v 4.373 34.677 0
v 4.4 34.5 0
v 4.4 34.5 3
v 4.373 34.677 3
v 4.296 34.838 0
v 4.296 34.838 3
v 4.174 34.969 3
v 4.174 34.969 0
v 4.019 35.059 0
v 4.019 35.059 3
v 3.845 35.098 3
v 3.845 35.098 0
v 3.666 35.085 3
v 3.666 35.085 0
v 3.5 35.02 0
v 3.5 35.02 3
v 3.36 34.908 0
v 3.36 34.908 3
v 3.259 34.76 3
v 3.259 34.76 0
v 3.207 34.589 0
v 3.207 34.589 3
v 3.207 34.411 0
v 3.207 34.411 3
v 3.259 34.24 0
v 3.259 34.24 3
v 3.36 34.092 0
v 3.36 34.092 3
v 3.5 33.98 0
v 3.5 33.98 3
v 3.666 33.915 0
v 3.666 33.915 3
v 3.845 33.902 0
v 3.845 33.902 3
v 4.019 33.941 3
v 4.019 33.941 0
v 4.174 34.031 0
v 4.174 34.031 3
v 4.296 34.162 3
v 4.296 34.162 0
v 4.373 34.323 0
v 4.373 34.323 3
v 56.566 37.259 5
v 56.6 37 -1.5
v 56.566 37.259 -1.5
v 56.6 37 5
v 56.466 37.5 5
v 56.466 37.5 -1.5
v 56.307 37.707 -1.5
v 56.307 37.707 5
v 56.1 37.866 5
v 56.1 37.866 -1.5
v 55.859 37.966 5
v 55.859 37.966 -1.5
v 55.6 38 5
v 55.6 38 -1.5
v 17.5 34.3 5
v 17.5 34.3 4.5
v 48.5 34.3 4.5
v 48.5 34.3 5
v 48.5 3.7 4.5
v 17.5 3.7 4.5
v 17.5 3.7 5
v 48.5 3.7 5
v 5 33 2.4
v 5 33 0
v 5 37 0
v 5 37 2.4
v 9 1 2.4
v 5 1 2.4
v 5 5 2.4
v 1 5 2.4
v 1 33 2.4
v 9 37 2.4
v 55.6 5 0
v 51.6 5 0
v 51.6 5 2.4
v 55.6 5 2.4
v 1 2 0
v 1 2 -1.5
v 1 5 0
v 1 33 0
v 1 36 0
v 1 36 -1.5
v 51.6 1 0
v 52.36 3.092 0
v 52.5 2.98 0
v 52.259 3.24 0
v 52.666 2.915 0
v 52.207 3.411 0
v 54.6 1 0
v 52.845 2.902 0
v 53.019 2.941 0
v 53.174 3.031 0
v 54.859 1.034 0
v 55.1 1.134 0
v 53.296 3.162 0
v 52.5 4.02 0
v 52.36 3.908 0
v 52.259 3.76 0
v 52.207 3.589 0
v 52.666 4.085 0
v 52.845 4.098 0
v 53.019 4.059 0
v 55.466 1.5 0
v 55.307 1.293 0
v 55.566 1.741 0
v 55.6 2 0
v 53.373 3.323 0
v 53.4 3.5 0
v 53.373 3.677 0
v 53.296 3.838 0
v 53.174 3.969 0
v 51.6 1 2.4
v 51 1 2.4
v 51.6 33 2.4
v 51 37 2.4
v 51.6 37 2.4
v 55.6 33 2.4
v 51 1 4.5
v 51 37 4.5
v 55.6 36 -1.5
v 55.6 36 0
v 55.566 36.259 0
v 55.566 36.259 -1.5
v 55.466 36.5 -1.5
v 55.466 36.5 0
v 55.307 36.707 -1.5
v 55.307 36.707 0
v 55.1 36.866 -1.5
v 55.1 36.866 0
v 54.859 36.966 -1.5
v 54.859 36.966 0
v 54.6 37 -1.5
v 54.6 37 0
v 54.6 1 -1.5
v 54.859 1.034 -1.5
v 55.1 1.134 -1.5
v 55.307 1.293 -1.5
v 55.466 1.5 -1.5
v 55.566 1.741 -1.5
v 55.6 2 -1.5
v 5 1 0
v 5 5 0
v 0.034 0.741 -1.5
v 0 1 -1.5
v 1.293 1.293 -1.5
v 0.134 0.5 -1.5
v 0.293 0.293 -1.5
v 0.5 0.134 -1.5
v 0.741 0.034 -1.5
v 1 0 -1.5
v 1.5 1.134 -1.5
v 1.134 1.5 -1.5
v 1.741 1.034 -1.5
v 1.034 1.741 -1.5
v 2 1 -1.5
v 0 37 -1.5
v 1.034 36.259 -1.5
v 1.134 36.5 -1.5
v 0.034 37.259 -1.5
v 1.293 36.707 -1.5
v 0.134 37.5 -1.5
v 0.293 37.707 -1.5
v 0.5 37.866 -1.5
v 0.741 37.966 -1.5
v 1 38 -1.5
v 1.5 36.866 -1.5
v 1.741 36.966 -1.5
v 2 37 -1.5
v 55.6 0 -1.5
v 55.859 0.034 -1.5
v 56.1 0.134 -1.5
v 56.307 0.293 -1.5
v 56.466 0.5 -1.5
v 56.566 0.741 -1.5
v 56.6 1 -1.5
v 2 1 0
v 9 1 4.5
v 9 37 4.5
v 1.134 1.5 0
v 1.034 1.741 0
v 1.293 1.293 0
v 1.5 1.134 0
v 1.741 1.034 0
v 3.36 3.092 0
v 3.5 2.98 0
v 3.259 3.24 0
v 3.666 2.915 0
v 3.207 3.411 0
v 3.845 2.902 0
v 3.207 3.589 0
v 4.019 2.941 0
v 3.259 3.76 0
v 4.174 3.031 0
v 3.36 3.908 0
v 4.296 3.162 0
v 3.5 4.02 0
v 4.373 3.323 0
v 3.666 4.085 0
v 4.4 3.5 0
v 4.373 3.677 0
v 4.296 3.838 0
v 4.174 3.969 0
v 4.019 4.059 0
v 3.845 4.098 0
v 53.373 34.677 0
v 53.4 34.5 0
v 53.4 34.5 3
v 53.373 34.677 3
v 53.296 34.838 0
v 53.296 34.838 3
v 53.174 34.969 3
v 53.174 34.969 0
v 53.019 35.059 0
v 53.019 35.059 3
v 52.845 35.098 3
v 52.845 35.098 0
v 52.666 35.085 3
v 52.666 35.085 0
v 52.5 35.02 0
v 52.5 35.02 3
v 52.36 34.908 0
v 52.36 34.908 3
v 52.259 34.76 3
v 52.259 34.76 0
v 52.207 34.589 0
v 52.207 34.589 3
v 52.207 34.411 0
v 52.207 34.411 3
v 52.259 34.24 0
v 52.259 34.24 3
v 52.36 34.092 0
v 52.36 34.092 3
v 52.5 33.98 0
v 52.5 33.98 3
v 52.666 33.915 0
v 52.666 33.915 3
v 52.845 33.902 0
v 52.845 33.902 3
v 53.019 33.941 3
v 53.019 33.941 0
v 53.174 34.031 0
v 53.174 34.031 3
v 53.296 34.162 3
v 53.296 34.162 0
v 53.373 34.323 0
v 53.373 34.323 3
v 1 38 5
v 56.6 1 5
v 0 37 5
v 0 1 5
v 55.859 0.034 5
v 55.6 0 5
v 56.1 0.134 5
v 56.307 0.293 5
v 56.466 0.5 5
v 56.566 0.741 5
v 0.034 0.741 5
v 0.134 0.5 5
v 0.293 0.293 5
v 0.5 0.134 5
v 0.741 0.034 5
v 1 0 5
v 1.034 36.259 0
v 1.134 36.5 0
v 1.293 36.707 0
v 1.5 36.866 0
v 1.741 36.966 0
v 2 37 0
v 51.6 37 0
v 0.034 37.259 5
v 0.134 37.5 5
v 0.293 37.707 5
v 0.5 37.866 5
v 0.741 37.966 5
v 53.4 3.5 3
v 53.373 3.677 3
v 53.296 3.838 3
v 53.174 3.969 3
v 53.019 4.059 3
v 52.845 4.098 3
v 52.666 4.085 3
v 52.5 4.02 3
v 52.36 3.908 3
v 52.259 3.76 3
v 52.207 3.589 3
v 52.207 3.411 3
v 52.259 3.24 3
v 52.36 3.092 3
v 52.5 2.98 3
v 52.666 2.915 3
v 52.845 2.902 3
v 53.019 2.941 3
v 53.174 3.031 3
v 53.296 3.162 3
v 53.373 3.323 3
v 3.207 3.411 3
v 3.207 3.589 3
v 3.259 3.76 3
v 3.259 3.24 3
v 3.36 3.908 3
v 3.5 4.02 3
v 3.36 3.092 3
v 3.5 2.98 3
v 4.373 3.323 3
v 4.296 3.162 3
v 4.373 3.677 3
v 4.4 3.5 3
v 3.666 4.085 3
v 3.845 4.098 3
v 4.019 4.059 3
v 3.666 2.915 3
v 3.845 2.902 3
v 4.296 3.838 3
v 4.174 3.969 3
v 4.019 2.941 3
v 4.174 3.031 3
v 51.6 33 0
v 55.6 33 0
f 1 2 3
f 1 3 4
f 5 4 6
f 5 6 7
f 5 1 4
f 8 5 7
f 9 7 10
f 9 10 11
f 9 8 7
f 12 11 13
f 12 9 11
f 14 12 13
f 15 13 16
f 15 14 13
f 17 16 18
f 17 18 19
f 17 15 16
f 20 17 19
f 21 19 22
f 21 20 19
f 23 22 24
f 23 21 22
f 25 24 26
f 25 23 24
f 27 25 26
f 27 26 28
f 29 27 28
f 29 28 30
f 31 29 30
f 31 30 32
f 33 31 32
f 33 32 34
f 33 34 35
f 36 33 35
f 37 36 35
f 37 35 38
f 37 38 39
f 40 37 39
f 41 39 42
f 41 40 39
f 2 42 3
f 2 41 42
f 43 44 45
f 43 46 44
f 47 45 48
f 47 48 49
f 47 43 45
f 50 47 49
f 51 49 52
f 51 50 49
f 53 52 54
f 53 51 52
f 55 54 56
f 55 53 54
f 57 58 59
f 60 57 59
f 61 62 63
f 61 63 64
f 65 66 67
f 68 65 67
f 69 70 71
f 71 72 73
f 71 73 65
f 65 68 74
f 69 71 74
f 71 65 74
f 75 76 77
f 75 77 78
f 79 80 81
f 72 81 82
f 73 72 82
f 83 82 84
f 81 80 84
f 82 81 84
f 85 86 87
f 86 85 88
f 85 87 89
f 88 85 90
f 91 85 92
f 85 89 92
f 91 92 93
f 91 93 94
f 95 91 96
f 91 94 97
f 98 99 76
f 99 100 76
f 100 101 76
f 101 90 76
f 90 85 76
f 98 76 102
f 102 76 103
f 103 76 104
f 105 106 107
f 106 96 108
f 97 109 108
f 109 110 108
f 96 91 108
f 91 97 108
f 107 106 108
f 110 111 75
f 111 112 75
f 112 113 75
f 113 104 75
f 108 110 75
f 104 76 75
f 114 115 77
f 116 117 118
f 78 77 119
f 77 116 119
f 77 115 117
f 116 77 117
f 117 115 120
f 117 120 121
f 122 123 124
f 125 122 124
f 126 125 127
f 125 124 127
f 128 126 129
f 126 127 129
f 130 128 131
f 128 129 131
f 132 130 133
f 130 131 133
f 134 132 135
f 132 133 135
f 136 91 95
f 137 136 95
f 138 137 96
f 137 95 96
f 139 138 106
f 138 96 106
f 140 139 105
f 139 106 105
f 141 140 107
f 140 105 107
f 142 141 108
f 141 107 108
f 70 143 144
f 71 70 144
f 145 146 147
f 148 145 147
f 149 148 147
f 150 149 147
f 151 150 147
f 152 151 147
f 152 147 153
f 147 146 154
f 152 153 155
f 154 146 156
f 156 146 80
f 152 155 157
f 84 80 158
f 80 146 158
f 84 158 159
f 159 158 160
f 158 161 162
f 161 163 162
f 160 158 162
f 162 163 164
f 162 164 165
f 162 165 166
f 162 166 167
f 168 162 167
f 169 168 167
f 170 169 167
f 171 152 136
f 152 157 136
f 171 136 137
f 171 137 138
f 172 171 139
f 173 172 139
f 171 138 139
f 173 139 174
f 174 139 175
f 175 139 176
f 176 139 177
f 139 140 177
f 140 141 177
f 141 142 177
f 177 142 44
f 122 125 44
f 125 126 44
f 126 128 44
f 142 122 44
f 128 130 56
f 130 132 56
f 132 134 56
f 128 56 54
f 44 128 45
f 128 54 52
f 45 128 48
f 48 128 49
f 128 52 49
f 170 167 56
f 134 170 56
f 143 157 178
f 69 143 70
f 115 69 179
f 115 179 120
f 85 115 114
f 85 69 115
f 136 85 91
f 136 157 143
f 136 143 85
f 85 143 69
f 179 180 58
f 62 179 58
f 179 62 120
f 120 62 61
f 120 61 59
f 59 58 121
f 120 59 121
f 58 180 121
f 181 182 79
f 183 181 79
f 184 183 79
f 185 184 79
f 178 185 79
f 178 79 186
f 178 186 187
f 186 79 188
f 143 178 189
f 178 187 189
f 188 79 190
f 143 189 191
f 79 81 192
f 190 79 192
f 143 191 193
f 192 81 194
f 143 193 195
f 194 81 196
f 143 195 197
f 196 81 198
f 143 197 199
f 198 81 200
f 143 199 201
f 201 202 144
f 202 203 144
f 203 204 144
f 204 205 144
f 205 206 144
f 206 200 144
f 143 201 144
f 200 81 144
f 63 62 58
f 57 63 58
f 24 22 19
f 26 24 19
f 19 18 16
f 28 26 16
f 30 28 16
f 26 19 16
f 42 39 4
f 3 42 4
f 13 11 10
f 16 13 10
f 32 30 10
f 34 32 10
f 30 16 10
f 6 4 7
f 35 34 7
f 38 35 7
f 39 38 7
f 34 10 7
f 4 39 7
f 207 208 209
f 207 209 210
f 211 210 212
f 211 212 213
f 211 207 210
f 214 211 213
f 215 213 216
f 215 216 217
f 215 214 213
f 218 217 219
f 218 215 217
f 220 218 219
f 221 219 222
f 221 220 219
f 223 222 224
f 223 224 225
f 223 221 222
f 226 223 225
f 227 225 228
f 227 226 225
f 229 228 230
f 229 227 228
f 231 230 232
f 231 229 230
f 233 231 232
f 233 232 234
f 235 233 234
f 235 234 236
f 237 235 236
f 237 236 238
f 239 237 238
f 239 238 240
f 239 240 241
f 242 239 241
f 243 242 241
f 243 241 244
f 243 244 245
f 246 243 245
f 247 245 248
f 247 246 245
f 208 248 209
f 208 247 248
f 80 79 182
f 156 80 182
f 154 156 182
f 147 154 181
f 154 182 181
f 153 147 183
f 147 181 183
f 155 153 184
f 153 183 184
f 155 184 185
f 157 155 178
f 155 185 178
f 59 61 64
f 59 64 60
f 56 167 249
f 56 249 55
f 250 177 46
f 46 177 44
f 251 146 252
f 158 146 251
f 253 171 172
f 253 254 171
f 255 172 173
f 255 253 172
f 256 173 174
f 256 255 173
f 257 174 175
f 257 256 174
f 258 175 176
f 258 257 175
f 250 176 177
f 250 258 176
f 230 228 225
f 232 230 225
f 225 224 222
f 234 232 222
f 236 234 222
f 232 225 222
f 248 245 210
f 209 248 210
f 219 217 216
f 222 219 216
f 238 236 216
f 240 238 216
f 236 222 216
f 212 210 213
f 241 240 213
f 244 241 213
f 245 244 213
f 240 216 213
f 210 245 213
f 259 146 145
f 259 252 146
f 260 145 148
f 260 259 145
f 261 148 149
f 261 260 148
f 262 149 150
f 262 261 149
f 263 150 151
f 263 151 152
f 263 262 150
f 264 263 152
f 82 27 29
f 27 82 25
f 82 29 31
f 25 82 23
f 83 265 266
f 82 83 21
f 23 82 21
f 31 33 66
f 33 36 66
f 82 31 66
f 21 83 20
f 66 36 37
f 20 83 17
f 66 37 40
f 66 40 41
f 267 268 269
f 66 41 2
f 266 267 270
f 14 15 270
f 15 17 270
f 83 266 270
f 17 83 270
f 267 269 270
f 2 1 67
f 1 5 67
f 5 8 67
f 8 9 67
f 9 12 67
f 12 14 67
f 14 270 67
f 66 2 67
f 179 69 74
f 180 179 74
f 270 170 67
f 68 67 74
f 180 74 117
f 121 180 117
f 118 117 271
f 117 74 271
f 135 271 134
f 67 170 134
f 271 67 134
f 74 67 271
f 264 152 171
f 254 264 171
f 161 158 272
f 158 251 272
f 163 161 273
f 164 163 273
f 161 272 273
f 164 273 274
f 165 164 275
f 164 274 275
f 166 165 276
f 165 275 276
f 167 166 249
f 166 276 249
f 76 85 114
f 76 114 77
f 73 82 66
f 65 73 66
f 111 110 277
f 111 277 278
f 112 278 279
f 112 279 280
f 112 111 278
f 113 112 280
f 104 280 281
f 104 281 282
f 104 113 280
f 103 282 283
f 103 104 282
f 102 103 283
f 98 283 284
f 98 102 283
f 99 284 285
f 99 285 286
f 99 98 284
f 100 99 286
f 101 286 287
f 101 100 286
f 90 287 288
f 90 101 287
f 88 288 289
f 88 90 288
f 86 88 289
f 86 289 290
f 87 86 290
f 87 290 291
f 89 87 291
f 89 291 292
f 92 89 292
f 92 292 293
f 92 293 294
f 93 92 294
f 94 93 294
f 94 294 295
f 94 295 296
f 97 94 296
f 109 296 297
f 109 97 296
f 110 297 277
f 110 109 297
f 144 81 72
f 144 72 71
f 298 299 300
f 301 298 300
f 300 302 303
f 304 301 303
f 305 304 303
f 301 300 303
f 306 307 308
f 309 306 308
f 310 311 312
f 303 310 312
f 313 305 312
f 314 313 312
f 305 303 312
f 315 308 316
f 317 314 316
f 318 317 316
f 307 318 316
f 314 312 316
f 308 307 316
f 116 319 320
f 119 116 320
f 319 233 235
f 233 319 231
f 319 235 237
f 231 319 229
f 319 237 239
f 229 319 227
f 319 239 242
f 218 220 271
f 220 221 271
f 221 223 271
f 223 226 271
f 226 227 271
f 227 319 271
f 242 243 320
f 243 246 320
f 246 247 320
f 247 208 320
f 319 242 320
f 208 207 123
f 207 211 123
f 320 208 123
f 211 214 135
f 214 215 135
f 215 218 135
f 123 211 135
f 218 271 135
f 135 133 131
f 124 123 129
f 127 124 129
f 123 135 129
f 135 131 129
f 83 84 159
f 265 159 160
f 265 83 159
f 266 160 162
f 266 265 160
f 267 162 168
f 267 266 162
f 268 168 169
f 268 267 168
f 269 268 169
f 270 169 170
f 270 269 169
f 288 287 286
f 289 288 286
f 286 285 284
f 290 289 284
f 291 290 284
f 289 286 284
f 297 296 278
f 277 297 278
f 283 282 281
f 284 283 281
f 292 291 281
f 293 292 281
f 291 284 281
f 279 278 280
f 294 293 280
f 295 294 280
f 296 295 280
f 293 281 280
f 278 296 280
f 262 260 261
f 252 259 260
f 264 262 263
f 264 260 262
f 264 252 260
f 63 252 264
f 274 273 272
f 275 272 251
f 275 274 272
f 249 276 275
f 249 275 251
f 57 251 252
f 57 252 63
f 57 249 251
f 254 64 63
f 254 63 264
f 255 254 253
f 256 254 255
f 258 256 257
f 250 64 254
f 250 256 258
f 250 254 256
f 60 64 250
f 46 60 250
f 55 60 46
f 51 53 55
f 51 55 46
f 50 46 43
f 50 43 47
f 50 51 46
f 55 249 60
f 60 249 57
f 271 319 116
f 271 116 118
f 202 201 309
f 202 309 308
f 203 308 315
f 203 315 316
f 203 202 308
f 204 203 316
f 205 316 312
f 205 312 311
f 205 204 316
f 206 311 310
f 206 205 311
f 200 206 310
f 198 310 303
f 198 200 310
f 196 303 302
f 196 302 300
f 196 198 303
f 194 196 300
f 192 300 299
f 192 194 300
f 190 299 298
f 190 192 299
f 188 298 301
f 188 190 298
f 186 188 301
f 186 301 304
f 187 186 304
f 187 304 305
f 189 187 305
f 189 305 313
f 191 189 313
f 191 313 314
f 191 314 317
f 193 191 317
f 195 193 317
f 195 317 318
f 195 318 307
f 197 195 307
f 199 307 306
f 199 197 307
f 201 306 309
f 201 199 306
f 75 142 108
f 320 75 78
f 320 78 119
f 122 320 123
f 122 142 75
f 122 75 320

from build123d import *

# Parameters (mm, degrees)
CYLINDER_R       = 0.6
CYLINDER_DEPTH   = 3
ARRAY001_X_COUNT = 2
ARRAY001_X_PITCH = 49
ARRAY001_Y_COUNT = 2
ARRAY001_Y_PITCH = 31
BOX008_W         = 31
BOX008_H         = 30.6
BOX008_DEPTH     = 10
BOX001_W         = 42
BOX001_H         = 36
BOX001_DEPTH     = 4.5
BOX002_W         = 4
BOX002_H         = 4
BOX002_DEPTH     = 2.4
ARRAY_X_COUNT    = 2
ARRAY_X_PITCH    = 50.6
ARRAY_Y_COUNT    = 2
ARRAY_Y_PITCH    = 32
BOX003_W         = 54.6
BOX003_H         = 36
BOX003_DEPTH     = 3.9
FILLET001_R      = 1
BOX_W            = 56.6
BOX_H            = 38
BOX_DEPTH        = 6.5
FILLET_R         = 1


with BuildPart() as hole_array:
    # Cylinder → Cylinder (new body)
    with BuildSketch(Plane(origin=(3.8, 3.5, 0), x_dir=(1, 0, 0), z_dir=(0, 0, 1))):
        Circle(CYLINDER_R)
    extrude(amount=CYLINDER_DEPTH)

    # Array001 X: hole array ×2


with BuildPart() as hole_array_1:
    add(hole_array.part)
    with Locations(*[(i * ARRAY001_X_PITCH, 0, 0) for i in range(1, ARRAY001_X_COUNT)]):
        add(hole_array.part)

    # Array001 Y: hole array ×2


with BuildPart() as hole_array_2:
    add(hole_array_1.part)
    with Locations(*[(0, i * ARRAY001_Y_PITCH, 0) for i in range(1, ARRAY001_Y_COUNT)]):
        add(hole_array_1.part)


with BuildPart() as display_hole:
    # Box008 → Box008 (new body)
    with BuildSketch(Plane(origin=(17.5, 3.7, 0), x_dir=(1, 0, 0), z_dir=(0, 0, 1))):
        with Locations((15.5, 15.3)):
            Rectangle(BOX008_W, BOX008_H)
    extrude(amount=BOX008_DEPTH)


with BuildPart() as hole_fusion:
    # Box001 → Box001 (new body)
    with BuildSketch(Plane(origin=(9, 1, 0), x_dir=(1, 0, 0), z_dir=(0, 0, 1))):
        with Locations((21, 18)):
            Rectangle(BOX001_W, BOX001_H)
    extrude(amount=BOX001_DEPTH)

    # Fusion001: union hole array, display_hole
    add(hole_array_2.part)
    add(display_hole.part)


with BuildPart() as hole_stand_array:
    # Box002 → Box002 (new body)
    with BuildSketch(Plane(origin=(1, 1, 0), x_dir=(1, 0, 0), z_dir=(0, 0, 1))):
        with Locations((2, 2)):
            Rectangle(BOX002_W, BOX002_H)
    extrude(amount=BOX002_DEPTH)

    # Array X: hole stand array ×2


with BuildPart() as hole_stand_array_1:
    add(hole_stand_array.part)
    with Locations(*[(i * ARRAY_X_PITCH, 0, 0) for i in range(1, ARRAY_X_COUNT)]):
        add(hole_stand_array.part)

    # Array Y: hole stand array ×2


with BuildPart() as hole_stand_array_2:
    add(hole_stand_array_1.part)
    with Locations(*[(0, i * ARRAY_Y_PITCH, 0) for i in range(1, ARRAY_Y_COUNT)]):
        add(hole_stand_array_1.part)


with BuildPart() as top_cover_extract_fillet:
    # Box003 → Box003 (new body)
    with BuildSketch(Plane(origin=(1, 1, -1.5), x_dir=(1, 0, 0), z_dir=(0, 0, 1))):
        with Locations((27.3, 18)):
            Rectangle(BOX003_W, BOX003_H)
    extrude(amount=BOX003_DEPTH)

    # Fillet001
    fillet001_edges = [top_cover_extract_fillet.edges().sort_by_distance(p)[0] for p in [
        (1, 1, 0.45),
        (1, 37, 0.45),
        (55.6, 1, 0.45),
        (55.6, 37, 0.45),
    ]]
    fillet(fillet001_edges, radius=FILLET001_R)


with BuildPart() as lcb_top_cover_cut:
    # Box → Box (new body)
    with BuildSketch(Plane.XY.offset(-1.5)):
        with Locations((28.3, 19)):
            Rectangle(BOX_W, BOX_H)
    extrude(amount=BOX_DEPTH)

    # Fillet
    fillet_edges = [lcb_top_cover_cut.edges().sort_by_distance(p)[0] for p in [
        (0, 0, 1.75),
        (0, 38, 1.75),
        (56.6, 0, 1.75),
        (56.6, 38, 1.75),
    ]]
    fillet(fillet_edges, radius=FILLET_R)

    # Cut: cut top cover extract fillet
    add(top_cover_extract_fillet.part, mode=Mode.SUBTRACT)

    # Fusion: union hole stand array
    add(hole_stand_array_2.part)

    # Cut001: cut hole fusion
    add(hole_fusion.part, mode=Mode.SUBTRACT)


solid = lcb_top_cover_cut.part
